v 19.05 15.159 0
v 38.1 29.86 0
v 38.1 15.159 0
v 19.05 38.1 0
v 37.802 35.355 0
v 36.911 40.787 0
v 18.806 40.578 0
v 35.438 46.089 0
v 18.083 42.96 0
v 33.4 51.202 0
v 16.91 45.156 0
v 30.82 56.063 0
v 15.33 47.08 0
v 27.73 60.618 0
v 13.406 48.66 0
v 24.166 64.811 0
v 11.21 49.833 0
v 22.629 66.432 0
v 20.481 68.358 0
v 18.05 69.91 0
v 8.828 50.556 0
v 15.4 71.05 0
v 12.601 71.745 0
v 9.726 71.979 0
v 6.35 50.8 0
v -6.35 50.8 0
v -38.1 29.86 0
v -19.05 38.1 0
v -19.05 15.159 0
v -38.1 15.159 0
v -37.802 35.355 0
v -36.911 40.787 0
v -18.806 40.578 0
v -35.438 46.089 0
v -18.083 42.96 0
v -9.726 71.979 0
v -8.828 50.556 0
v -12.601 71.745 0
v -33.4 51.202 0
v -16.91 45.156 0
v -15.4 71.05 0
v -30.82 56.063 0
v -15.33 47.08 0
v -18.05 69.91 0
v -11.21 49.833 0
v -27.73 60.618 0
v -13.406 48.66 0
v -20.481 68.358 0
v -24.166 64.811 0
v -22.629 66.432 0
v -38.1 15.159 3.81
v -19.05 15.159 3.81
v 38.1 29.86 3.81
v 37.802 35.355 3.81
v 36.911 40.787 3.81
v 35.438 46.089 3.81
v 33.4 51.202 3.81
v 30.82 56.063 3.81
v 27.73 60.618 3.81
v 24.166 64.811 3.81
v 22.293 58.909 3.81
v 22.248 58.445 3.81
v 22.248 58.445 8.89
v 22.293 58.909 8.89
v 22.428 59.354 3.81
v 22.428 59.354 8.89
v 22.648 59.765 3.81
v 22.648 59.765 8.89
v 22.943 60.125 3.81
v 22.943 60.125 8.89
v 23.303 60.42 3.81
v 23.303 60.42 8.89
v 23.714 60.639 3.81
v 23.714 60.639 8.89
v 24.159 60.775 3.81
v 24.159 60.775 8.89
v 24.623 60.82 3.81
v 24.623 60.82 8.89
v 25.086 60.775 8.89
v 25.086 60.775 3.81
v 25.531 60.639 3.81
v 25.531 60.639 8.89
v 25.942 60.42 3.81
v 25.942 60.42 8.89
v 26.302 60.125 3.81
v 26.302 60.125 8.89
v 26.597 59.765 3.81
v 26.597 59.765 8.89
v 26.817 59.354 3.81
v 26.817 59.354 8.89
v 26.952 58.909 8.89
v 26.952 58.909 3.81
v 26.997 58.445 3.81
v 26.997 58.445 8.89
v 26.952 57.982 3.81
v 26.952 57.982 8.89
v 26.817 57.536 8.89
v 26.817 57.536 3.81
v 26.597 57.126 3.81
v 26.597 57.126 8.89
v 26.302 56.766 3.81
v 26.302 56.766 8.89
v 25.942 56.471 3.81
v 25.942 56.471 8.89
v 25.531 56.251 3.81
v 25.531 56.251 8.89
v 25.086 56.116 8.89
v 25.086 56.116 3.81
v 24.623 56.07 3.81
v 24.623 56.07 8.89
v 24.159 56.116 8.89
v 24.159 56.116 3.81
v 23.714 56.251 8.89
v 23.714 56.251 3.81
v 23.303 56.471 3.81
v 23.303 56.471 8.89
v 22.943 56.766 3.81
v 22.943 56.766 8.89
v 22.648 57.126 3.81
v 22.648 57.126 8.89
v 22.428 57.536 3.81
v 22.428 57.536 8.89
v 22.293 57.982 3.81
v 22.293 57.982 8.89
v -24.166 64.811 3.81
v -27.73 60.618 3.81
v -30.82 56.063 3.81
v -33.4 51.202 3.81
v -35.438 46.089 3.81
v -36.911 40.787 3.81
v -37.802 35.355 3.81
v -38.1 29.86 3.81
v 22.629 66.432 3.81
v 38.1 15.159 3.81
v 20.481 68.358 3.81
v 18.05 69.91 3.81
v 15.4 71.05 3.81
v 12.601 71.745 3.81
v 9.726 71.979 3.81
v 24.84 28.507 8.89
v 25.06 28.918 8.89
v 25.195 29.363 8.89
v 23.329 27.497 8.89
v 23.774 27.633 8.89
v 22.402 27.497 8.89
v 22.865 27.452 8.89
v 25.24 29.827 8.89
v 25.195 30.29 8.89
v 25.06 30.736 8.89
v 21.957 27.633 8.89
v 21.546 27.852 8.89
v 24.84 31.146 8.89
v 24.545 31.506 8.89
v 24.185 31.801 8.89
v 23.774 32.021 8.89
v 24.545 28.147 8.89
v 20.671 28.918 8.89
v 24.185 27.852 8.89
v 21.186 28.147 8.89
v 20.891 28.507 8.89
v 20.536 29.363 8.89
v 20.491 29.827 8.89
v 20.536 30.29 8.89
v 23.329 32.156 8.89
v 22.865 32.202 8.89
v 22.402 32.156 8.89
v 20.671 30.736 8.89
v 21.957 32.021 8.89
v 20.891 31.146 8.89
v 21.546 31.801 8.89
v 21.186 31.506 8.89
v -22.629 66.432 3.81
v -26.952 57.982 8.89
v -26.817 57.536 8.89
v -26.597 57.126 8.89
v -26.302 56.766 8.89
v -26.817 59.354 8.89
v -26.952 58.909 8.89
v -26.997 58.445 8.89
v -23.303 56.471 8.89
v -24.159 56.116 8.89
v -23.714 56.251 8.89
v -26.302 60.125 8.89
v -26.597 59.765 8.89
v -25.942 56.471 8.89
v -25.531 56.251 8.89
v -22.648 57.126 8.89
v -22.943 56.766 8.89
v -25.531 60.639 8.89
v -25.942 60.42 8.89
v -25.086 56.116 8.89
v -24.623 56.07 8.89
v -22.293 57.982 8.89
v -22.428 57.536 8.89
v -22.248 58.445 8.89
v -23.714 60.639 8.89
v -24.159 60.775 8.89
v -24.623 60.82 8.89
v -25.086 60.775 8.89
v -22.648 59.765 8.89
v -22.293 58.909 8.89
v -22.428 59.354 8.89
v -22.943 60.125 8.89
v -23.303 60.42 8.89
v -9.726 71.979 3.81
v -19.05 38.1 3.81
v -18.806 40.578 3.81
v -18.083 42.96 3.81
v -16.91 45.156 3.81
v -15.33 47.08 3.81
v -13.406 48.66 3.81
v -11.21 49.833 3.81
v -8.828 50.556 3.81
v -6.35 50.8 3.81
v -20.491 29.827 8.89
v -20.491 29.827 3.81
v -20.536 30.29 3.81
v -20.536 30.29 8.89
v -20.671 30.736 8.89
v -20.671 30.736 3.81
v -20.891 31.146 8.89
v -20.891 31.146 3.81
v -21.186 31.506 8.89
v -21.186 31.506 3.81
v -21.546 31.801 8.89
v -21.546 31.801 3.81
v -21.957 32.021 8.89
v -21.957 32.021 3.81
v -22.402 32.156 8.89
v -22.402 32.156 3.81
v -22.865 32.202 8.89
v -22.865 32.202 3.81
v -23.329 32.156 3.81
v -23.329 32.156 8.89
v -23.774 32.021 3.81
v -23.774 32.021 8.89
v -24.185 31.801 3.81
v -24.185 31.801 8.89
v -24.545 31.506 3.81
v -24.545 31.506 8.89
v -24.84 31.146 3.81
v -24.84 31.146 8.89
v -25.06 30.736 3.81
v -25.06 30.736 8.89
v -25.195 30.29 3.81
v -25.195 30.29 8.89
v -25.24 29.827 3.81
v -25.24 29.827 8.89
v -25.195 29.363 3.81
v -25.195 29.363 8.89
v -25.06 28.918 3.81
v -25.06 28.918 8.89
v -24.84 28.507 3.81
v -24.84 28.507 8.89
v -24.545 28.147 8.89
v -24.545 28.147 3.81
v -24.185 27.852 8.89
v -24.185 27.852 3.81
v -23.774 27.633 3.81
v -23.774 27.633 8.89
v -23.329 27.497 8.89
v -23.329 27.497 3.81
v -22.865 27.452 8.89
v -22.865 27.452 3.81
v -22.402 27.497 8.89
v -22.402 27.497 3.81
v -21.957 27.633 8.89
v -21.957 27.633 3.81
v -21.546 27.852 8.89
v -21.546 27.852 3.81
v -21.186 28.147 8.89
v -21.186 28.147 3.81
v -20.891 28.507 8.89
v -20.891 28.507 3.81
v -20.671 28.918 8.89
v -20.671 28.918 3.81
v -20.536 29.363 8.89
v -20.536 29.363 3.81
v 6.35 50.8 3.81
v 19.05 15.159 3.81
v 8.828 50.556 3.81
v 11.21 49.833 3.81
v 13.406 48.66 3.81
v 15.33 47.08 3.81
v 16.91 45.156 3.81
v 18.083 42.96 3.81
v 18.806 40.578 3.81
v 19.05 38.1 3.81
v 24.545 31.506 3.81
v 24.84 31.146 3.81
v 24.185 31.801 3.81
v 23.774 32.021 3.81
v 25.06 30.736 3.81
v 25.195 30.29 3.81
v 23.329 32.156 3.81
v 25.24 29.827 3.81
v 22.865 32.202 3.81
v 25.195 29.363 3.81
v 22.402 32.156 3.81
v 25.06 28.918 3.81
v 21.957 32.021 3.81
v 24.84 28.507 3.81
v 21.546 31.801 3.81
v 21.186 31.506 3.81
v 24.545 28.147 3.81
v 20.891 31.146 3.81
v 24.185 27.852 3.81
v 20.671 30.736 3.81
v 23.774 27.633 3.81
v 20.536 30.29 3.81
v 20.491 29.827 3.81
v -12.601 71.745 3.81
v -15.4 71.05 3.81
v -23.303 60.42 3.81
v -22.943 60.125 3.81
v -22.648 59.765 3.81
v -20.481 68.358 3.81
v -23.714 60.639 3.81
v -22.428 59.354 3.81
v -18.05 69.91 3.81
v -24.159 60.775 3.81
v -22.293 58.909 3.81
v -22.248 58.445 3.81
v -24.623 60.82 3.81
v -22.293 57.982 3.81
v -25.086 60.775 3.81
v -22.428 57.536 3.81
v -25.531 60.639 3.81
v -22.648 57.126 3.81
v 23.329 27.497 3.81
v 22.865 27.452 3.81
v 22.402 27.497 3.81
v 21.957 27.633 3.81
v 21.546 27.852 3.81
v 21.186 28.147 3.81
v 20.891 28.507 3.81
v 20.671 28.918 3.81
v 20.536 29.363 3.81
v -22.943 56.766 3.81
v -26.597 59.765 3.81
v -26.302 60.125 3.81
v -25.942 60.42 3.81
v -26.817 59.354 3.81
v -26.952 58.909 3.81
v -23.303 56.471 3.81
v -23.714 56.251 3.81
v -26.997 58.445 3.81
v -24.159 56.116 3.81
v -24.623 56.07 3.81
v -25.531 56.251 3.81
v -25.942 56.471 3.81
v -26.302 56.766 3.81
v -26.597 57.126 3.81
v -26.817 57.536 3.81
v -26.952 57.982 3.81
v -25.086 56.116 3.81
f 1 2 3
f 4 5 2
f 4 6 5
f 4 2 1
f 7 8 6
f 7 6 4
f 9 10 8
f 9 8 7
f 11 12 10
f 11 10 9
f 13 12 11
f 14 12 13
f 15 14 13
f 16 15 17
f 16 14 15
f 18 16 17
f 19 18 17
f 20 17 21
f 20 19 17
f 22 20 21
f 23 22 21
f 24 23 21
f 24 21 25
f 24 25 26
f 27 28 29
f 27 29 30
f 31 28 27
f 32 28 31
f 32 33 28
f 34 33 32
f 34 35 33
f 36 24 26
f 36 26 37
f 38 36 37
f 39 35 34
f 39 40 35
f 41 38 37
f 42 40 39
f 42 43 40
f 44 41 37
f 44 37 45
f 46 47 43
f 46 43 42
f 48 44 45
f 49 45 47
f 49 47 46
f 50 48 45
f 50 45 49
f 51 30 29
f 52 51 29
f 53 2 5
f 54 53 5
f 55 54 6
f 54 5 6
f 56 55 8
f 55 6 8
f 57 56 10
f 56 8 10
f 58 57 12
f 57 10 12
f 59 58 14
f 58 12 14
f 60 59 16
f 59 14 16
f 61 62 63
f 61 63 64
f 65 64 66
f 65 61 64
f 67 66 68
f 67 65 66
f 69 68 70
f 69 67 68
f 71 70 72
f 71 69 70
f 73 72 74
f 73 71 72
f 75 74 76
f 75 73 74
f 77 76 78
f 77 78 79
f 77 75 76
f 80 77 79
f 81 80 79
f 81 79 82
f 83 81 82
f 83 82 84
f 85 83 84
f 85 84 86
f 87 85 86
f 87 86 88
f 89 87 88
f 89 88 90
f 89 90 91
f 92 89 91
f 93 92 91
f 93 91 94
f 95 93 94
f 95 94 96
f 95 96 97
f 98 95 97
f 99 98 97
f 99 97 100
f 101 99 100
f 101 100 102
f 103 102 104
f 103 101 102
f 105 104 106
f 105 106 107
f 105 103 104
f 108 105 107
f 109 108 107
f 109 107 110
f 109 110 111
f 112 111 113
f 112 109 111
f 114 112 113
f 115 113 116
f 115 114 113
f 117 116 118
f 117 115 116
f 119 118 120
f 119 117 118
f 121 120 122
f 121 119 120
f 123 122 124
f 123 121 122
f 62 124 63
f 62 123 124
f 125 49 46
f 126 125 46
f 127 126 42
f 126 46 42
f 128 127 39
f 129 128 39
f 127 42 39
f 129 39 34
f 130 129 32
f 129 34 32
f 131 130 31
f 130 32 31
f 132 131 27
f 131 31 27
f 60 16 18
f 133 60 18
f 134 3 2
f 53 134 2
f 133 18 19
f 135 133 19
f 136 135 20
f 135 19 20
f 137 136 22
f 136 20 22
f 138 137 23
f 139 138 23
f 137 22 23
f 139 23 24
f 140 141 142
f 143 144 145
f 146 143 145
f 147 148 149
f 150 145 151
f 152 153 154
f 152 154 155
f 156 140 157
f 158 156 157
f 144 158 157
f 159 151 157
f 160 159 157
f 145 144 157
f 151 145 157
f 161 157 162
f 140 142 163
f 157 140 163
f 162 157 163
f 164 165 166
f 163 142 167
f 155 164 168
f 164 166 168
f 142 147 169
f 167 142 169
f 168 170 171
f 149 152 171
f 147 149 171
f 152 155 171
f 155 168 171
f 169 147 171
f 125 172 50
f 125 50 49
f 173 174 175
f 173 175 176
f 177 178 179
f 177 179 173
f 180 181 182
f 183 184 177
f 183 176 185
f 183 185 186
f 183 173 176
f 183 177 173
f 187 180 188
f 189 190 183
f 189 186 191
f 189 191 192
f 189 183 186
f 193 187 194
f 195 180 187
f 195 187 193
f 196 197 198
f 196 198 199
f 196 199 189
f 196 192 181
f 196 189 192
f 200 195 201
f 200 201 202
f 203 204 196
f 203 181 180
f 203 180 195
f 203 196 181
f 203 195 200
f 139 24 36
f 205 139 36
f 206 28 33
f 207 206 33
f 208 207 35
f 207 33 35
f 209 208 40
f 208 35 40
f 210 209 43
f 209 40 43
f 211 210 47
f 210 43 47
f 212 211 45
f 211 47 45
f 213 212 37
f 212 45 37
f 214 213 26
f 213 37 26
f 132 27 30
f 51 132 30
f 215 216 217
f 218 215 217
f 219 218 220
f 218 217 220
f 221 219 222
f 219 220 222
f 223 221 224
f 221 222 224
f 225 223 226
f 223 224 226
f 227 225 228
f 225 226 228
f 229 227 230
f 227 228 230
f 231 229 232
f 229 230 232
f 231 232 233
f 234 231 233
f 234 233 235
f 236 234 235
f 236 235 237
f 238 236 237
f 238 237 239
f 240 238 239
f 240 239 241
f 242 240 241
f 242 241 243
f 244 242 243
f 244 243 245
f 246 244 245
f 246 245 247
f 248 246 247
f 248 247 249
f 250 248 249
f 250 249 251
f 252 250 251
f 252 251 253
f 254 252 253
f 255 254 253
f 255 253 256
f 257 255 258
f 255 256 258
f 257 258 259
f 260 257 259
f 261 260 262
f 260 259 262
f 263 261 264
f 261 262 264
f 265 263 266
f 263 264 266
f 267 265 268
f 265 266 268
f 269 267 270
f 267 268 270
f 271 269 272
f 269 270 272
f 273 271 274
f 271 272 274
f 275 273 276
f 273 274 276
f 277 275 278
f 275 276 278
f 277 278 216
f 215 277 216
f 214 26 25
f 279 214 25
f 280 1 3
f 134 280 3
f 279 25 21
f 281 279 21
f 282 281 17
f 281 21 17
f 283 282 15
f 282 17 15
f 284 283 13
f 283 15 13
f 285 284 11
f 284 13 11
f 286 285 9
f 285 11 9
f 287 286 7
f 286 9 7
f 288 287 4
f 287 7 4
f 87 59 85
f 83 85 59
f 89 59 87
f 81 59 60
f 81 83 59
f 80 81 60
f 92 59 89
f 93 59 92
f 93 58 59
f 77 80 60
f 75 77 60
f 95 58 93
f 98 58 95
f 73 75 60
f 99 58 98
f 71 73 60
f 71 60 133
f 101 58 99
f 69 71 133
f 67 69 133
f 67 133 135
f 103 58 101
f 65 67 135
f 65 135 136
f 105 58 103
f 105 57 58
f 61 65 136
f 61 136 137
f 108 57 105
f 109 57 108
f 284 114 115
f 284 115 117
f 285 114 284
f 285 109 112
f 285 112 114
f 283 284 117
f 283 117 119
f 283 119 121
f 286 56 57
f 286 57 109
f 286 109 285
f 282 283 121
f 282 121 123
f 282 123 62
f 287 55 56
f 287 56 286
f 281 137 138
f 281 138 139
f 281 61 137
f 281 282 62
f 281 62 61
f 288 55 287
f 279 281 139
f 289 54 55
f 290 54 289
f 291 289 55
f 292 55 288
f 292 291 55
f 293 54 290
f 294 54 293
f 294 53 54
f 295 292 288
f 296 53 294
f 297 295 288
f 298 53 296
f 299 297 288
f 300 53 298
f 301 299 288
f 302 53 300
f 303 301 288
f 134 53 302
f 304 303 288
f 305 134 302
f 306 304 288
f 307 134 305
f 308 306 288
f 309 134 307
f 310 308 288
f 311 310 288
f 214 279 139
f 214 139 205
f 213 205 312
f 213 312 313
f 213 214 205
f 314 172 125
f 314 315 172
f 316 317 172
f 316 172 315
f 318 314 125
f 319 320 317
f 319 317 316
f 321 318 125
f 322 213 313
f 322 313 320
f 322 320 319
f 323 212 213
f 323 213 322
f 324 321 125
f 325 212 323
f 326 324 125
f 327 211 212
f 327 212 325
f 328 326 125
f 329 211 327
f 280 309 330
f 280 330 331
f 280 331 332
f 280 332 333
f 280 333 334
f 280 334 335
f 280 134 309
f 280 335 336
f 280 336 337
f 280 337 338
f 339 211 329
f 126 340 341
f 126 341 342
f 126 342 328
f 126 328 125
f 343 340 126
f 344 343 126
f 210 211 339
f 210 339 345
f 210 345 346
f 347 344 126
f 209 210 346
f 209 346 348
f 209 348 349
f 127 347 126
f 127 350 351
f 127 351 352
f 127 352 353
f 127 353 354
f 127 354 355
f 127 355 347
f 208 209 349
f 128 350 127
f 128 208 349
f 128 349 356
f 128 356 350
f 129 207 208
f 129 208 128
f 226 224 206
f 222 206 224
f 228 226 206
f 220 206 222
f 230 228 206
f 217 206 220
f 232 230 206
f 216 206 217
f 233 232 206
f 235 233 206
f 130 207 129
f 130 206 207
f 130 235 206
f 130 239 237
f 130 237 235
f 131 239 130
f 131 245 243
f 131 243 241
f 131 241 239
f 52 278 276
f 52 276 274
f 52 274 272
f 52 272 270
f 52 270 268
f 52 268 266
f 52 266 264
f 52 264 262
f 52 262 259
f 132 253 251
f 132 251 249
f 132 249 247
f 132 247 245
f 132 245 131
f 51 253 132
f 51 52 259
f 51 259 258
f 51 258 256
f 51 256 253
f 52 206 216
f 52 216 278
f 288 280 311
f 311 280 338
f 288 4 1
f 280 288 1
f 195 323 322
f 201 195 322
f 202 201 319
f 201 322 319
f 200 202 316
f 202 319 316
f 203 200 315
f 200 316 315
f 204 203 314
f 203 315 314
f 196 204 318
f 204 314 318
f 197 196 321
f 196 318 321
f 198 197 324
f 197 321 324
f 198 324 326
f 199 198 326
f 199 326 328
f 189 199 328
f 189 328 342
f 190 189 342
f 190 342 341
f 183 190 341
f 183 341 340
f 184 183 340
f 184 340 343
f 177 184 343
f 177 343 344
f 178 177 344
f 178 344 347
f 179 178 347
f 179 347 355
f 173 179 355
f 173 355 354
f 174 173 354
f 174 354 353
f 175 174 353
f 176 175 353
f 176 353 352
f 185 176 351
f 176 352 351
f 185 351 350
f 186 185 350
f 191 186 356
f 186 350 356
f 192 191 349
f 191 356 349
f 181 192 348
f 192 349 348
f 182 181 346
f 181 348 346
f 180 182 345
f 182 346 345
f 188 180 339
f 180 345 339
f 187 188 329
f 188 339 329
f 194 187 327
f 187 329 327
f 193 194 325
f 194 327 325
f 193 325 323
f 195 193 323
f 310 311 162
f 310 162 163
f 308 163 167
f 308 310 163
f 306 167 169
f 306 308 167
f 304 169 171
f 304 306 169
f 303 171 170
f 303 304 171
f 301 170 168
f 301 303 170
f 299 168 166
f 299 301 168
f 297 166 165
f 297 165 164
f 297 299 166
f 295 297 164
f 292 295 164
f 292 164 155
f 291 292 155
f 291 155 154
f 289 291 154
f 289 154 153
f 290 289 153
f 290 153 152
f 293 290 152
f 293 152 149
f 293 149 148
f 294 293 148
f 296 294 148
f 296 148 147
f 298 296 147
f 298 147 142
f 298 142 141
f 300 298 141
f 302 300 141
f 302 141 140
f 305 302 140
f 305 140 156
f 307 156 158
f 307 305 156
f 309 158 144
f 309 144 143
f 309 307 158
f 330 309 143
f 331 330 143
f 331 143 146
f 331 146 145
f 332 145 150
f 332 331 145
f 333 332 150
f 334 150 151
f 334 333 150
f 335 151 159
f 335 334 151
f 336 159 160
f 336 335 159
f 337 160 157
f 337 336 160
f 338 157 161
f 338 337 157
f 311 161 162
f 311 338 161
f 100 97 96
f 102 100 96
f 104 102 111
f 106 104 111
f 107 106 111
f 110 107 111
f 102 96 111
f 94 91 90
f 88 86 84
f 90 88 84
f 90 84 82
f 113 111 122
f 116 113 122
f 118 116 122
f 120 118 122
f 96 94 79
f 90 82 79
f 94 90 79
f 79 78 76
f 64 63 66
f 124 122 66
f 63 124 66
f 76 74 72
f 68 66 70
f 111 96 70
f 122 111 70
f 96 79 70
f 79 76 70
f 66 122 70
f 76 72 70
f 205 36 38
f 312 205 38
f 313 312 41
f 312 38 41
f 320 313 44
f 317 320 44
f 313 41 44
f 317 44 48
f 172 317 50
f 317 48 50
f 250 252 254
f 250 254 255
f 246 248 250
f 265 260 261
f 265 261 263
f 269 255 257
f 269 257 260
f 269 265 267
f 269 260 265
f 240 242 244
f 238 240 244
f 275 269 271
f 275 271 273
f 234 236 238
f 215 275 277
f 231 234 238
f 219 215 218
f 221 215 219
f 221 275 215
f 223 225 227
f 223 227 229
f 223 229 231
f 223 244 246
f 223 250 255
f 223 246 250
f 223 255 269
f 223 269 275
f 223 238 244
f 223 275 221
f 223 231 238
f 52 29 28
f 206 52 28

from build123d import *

# Parameters (mm, degrees)
BOSS_EXTRUDE1_DEPTH = 3.81
SKETCH3_R           = 2.3749
BOSS_EXTRUDE2_DEPTH = 8.89


with BuildPart() as part:
    # Sketch1 → Boss-Extrude1 (new body)
    with BuildSketch(Plane(origin=(0, 0, 0), x_dir=(-1, 0, 0), z_dir=(0, 0, 1))):
        with BuildLine():
            Line((22.628547269, -66.432139719), (24.16561852, -64.81086345))
            ThreePointArc((24.16561852, -64.81086345), (34.487993287, -48.673067402), (38.1, -29.859952573))
            Line((38.1, -29.859952573), (38.1, -15.158740079))
            Line((38.1, -15.158740079), (19.05, -15.158740079))
            Line((19.05, -15.158740079), (19.05, -38.1))
            ThreePointArc((19.05, -38.1), (15.330256121, -47.080256121), (6.35, -50.8))
            Line((6.35, -50.8), (-6.35, -50.8))
            ThreePointArc((-6.35, -50.8), (-15.330256121, -47.080256121), (-19.05, -38.1))
            Line((-19.05, -38.1), (-19.05, -15.158740079))
            Line((-19.05, -15.158740079), (-38.1, -15.158740079))
            Line((-38.1, -15.158740079), (-38.1, -29.859952521))
            ThreePointArc((-38.1, -29.859952521), (-34.48799327, -48.673067394), (-24.165618457, -64.810863465))
            Line((-24.165618457, -64.810863465), (-22.628547192, -66.432139742))
            ThreePointArc((-22.628547192, -66.432139742), (-16.748004858, -70.533761809), (-9.725580732, -71.979320912))
            Line((-9.725580732, -71.979320912), (9.725580787, -71.979320912))
            ThreePointArc((9.725580787, -71.979320912), (16.748004927, -70.533761802), (22.628547269, -66.432139719))
        make_face()
    extrude(amount=BOSS_EXTRUDE1_DEPTH)

    # Sketch3 → Boss-Extrude2 (add)
    with BuildSketch(Plane.XY):
        with Locations((-24.622521445, 58.445286133)):
            Circle(SKETCH3_R)
        with Locations((-22.865421031, 29.826745675)):
            Circle(SKETCH3_R)
    boss_extrude2 = extrude(amount=BOSS_EXTRUDE2_DEPTH)

    # Mirror1: Boss-Extrude2 across plane
    add(boss_extrude2.mirror(Plane(origin=(0, 0, 0), x_dir=(0, 0, 1), z_dir=(1, 0, 0))))


solid = part.part
